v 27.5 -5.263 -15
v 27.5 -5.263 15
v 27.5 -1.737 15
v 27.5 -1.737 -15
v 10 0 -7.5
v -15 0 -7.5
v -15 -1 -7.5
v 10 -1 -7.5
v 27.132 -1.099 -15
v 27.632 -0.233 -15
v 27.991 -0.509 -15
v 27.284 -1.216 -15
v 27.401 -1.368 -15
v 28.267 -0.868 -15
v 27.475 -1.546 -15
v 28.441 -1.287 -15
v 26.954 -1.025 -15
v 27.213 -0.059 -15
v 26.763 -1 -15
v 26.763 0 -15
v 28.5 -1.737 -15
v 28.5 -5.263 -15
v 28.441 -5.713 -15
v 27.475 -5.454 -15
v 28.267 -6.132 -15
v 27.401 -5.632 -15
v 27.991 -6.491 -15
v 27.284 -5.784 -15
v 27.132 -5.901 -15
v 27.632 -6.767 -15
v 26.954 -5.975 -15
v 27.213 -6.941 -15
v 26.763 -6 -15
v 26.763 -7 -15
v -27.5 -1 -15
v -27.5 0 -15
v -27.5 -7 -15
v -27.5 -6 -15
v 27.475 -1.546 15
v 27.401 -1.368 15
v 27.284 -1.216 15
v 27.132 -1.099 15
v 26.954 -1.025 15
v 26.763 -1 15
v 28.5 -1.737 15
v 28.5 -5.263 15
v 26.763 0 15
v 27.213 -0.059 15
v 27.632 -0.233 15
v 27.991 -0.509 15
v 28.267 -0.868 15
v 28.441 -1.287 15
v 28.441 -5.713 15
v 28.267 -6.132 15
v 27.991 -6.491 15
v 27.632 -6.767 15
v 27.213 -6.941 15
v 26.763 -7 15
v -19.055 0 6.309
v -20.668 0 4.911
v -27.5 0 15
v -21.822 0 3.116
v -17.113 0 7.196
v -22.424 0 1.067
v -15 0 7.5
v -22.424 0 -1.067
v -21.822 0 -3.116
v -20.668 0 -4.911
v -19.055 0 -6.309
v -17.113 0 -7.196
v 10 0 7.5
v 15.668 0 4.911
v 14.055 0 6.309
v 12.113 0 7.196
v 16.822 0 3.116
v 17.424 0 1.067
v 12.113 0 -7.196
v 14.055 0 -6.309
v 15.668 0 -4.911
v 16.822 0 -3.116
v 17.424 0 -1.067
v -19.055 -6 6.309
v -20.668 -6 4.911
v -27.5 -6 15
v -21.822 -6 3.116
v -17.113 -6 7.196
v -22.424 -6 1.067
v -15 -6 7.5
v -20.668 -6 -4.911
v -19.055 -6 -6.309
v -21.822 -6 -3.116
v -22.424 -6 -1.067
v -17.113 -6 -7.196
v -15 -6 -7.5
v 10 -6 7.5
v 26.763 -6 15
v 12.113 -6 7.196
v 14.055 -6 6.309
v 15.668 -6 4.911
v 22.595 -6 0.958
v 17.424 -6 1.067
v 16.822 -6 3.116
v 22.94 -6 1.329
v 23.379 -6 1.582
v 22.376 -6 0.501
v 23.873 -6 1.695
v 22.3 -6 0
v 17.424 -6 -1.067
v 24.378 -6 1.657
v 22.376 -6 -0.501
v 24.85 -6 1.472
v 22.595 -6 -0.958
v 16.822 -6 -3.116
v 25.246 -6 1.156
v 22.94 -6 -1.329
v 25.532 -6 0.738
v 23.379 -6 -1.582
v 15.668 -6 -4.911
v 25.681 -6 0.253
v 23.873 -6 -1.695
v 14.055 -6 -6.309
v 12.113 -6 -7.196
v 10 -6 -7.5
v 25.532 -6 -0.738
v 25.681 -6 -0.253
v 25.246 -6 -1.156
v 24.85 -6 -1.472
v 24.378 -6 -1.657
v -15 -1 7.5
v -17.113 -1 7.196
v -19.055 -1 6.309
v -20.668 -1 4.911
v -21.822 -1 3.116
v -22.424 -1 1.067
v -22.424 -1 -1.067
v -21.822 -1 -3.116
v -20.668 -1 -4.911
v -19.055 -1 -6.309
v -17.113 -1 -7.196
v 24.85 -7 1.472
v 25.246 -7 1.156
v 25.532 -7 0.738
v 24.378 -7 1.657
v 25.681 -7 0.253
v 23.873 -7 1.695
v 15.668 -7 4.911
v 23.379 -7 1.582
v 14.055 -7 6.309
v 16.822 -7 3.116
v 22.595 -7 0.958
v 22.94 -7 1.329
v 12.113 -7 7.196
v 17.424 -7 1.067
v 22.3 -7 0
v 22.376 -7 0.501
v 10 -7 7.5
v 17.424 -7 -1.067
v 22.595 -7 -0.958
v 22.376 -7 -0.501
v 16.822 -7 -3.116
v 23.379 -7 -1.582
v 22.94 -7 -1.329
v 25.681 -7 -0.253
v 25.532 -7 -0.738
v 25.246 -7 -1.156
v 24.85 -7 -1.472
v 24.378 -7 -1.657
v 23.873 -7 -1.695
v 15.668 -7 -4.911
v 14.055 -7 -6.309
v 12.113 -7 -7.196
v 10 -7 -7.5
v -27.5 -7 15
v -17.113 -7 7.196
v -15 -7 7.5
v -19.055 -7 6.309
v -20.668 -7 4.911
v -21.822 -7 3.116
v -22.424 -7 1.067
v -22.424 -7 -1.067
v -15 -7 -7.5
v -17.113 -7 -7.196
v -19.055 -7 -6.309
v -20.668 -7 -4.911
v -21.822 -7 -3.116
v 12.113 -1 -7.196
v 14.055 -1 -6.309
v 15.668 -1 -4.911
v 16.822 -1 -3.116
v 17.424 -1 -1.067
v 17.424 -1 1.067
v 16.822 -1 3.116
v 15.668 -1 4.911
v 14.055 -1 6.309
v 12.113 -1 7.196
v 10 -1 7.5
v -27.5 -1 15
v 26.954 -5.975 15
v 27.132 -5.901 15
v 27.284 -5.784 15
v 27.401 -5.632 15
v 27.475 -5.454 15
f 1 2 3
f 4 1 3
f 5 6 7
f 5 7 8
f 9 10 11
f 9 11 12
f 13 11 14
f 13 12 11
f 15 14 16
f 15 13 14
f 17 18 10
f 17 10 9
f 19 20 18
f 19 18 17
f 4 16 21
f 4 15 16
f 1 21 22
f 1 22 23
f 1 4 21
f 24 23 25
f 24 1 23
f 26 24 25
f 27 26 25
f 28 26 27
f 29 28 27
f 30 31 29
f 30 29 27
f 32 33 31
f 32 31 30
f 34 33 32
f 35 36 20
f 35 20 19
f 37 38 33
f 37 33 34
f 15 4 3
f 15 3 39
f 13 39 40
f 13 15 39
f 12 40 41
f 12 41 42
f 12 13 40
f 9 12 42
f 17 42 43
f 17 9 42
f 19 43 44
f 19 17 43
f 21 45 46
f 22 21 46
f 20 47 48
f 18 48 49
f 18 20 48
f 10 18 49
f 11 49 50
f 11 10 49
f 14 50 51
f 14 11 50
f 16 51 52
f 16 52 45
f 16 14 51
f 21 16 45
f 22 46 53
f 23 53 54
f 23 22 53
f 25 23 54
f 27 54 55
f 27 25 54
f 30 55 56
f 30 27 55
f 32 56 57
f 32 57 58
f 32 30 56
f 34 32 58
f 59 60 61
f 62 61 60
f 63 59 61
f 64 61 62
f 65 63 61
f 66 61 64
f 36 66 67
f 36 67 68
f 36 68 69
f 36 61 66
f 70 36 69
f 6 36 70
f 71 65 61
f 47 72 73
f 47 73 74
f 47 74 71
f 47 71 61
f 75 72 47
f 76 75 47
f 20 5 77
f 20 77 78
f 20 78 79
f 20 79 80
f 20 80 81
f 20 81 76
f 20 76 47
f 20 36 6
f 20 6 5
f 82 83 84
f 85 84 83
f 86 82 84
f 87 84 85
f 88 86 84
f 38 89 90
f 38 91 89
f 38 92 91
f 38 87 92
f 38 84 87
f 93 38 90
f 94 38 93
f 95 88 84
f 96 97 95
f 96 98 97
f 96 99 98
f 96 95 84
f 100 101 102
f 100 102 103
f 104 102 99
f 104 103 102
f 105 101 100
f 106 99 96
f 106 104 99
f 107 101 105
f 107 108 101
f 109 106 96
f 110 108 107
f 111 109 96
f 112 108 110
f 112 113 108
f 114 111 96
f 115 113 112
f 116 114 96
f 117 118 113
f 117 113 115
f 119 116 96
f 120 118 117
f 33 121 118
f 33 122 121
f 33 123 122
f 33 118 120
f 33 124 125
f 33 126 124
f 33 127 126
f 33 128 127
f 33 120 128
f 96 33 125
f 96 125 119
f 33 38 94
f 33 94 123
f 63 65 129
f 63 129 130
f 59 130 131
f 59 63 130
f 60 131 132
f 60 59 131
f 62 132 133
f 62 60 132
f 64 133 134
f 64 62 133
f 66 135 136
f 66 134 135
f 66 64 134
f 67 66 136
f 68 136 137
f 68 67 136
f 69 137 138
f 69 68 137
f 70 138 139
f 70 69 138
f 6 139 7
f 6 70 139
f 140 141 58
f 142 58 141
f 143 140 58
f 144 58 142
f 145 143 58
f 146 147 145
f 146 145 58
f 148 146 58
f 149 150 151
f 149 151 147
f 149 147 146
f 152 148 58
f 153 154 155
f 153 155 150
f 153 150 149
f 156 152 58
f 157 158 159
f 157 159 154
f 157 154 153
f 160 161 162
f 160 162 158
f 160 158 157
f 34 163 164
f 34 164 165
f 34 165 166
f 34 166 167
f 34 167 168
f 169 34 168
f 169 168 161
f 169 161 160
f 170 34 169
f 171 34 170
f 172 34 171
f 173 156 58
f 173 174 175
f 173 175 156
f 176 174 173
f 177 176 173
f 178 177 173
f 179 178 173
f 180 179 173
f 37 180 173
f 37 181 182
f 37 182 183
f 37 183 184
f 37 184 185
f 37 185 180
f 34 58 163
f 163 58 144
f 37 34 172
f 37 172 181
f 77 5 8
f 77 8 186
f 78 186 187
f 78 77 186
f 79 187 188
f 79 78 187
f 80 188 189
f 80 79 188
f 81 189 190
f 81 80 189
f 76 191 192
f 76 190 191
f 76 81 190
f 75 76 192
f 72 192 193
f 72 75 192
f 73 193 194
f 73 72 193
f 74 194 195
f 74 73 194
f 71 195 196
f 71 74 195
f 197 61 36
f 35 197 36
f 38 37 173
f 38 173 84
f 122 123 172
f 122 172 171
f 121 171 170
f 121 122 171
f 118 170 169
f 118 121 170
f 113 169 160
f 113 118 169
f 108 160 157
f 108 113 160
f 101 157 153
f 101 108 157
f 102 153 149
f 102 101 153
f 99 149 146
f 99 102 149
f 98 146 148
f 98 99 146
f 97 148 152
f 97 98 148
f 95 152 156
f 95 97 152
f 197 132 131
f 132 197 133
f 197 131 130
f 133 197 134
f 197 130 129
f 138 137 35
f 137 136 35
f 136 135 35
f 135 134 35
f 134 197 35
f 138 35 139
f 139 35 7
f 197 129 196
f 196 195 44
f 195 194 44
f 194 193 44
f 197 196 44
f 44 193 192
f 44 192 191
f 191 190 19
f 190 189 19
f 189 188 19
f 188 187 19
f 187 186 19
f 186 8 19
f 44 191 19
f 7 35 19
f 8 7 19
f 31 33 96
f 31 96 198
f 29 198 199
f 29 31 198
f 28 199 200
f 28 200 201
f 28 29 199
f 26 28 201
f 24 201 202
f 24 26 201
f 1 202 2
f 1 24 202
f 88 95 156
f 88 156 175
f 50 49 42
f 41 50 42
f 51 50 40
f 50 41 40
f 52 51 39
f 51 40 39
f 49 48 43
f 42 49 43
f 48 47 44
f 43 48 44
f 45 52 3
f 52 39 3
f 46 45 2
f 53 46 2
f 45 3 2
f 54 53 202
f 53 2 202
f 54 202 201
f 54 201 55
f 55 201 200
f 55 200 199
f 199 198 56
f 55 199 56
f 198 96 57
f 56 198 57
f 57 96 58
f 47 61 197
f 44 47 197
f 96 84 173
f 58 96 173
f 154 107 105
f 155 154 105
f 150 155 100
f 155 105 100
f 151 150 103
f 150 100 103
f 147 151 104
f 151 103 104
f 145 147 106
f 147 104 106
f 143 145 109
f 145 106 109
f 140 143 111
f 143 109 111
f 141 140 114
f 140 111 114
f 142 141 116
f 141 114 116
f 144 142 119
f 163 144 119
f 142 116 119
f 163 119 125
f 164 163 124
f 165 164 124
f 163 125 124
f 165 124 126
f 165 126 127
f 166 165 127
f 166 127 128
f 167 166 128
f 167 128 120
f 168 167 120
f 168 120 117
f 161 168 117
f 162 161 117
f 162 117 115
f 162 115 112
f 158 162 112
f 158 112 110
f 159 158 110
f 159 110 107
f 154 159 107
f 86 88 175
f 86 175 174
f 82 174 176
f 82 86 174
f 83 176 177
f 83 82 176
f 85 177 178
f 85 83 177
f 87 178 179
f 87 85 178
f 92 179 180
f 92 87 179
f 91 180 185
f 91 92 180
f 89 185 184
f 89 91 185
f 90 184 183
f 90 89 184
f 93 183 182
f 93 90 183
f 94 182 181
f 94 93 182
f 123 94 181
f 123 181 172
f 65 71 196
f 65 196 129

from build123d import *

# Parameters (mm, degrees)
ESQUISSE2_W                           = 55
ESQUISSE2_H                           = 30
T_LE_DE_BASE_PLI_E1_DEPTH             = 1
T_LE_PLI_E_SUR_AR_TE1_STRIP_W         = 5.4732
T_LE_PLI_E_SUR_AR_TE1_STRIP_H         = 1
T_LE_PLI_E_SUR_AR_TE1_STRIP_CUT_DEPTH = 30
T_LE_PLI_E_SUR_AR_TE1_DEPTH           = 30
T_LE_PLI_E_SUR_AR_TE2_STRIP_W         = 5.4732
T_LE_PLI_E_SUR_AR_TE2_STRIP_H         = 1
T_LE_PLI_E_SUR_AR_TE2_STRIP_CUT_DEPTH = 30
T_LE_PLI_E_SUR_AR_TE2_DEPTH           = 30
ENL_V_MAT_EXTRU_1_DEPTH               = 33.958306995
ESQUISSE29_R                          = 1.7
ENL_V_MAT_EXTRU_3_DEPTH               = 33.760494502


# Sheet-metal steps are written as plain solids
with BuildPart() as part:
    # Esquisse2 → Tôle de base pliée1 (new body)
    with BuildSketch(Plane(origin=(0, 0, 0), x_dir=(1, 0, 0), z_dir=(0, 1, 0))):
        Rectangle(ESQUISSE2_W, ESQUISSE2_H)
    extrude(amount=-T_LE_DE_BASE_PLI_E1_DEPTH)

    # Tôle pliée sur arête1 strip (across the edge) → Tôle pliée sur arête1 strip cut (cut)
    with BuildSketch(Plane(origin=(27.5, -1, -15), x_dir=(-1, 0, 0), z_dir=(0, 0, 1))):
        with Locations((-2, -0.5)):
            Rectangle(T_LE_PLI_E_SUR_AR_TE1_STRIP_W, T_LE_PLI_E_SUR_AR_TE1_STRIP_H)
    extrude(amount=T_LE_PLI_E_SUR_AR_TE1_STRIP_CUT_DEPTH, mode=Mode.SUBTRACT)

    # Tôle pliée sur arête1 section (across the edge) → Tôle pliée sur arête1 (add)
    with BuildSketch(Plane(origin=(27.5, -1, -15), x_dir=(-1, 0, 0), z_dir=(0, 0, 1))):
        with BuildLine():
            Line((-1, 0.7366), (-1, 5))
            Line((-1, 5), (0, 5))
            Line((0, 5), (0, 0.7366))
            ThreePointArc((0, 0.7366), (0.215745145, 0.215745145), (0.7366, 0))
            Line((0.7366, 0), (0.7366, -1))
            ThreePointArc((0.7366, -1), (-0.491361636, -0.491361636), (-1, 0.7366))
        make_face()
    extrude(amount=T_LE_PLI_E_SUR_AR_TE1_DEPTH)

    # Tôle pliée sur arête2 strip (across the edge) → Tôle pliée sur arête2 strip cut (cut)
    with BuildSketch(Plane(origin=(27.5, -6, -15), x_dir=(0, 1, 0), z_dir=(0, 0, 1))):
        with Locations((-2, -0.5)):
            Rectangle(T_LE_PLI_E_SUR_AR_TE2_STRIP_W, T_LE_PLI_E_SUR_AR_TE2_STRIP_H)
    extrude(amount=T_LE_PLI_E_SUR_AR_TE2_STRIP_CUT_DEPTH, mode=Mode.SUBTRACT)

    # Tôle pliée sur arête2 section (across the edge) → Tôle pliée sur arête2 (add)
    with BuildSketch(Plane(origin=(27.5, -6, -15), x_dir=(0, 1, 0), z_dir=(0, 0, 1))):
        with BuildLine():
            Line((-1, 0.7366), (-1, 55))
            Line((-1, 55), (0, 55))
            Line((0, 55), (0, 0.7366))
            ThreePointArc((0, 0.7366), (0.215745145, 0.215745145), (0.7366, 0))
            Line((0.7366, 0), (0.7366, -1))
            ThreePointArc((0.7366, -1), (-0.491361636, -0.491361636), (-1, 0.7366))
        make_face()
    extrude(amount=T_LE_PLI_E_SUR_AR_TE2_DEPTH)

    # Esquisse26 → Enlèv. mat.-Extru.1 (cut, through all)
    with BuildSketch(Plane(origin=(0, 0, 0), x_dir=(1, 0, 0), z_dir=(0, 1, 0))):
        with BuildLine():
            Line((-15, 7.5), (10, 7.5))
            ThreePointArc((10, 7.5), (17.5, 0), (10, -7.5))
            Line((10, -7.5), (-15, -7.5))
            ThreePointArc((-15, -7.5), (-22.5, 0), (-15, 7.5))
        make_face()
    extrude(amount=-ENL_V_MAT_EXTRU_1_DEPTH, mode=Mode.SUBTRACT)

    # Esquisse29 → Enlèv. mat.-Extru.3 (cut, through all)
    with BuildSketch(Plane(origin=(0, -6, 0), x_dir=(1, 0, 0), z_dir=(0, 1, 0))):
        with Locations(Location((24, 0, 0), (0, 0, 180))):
            Circle(ESQUISSE29_R)
    extrude(amount=-ENL_V_MAT_EXTRU_3_DEPTH, mode=Mode.SUBTRACT)


solid = part.part
